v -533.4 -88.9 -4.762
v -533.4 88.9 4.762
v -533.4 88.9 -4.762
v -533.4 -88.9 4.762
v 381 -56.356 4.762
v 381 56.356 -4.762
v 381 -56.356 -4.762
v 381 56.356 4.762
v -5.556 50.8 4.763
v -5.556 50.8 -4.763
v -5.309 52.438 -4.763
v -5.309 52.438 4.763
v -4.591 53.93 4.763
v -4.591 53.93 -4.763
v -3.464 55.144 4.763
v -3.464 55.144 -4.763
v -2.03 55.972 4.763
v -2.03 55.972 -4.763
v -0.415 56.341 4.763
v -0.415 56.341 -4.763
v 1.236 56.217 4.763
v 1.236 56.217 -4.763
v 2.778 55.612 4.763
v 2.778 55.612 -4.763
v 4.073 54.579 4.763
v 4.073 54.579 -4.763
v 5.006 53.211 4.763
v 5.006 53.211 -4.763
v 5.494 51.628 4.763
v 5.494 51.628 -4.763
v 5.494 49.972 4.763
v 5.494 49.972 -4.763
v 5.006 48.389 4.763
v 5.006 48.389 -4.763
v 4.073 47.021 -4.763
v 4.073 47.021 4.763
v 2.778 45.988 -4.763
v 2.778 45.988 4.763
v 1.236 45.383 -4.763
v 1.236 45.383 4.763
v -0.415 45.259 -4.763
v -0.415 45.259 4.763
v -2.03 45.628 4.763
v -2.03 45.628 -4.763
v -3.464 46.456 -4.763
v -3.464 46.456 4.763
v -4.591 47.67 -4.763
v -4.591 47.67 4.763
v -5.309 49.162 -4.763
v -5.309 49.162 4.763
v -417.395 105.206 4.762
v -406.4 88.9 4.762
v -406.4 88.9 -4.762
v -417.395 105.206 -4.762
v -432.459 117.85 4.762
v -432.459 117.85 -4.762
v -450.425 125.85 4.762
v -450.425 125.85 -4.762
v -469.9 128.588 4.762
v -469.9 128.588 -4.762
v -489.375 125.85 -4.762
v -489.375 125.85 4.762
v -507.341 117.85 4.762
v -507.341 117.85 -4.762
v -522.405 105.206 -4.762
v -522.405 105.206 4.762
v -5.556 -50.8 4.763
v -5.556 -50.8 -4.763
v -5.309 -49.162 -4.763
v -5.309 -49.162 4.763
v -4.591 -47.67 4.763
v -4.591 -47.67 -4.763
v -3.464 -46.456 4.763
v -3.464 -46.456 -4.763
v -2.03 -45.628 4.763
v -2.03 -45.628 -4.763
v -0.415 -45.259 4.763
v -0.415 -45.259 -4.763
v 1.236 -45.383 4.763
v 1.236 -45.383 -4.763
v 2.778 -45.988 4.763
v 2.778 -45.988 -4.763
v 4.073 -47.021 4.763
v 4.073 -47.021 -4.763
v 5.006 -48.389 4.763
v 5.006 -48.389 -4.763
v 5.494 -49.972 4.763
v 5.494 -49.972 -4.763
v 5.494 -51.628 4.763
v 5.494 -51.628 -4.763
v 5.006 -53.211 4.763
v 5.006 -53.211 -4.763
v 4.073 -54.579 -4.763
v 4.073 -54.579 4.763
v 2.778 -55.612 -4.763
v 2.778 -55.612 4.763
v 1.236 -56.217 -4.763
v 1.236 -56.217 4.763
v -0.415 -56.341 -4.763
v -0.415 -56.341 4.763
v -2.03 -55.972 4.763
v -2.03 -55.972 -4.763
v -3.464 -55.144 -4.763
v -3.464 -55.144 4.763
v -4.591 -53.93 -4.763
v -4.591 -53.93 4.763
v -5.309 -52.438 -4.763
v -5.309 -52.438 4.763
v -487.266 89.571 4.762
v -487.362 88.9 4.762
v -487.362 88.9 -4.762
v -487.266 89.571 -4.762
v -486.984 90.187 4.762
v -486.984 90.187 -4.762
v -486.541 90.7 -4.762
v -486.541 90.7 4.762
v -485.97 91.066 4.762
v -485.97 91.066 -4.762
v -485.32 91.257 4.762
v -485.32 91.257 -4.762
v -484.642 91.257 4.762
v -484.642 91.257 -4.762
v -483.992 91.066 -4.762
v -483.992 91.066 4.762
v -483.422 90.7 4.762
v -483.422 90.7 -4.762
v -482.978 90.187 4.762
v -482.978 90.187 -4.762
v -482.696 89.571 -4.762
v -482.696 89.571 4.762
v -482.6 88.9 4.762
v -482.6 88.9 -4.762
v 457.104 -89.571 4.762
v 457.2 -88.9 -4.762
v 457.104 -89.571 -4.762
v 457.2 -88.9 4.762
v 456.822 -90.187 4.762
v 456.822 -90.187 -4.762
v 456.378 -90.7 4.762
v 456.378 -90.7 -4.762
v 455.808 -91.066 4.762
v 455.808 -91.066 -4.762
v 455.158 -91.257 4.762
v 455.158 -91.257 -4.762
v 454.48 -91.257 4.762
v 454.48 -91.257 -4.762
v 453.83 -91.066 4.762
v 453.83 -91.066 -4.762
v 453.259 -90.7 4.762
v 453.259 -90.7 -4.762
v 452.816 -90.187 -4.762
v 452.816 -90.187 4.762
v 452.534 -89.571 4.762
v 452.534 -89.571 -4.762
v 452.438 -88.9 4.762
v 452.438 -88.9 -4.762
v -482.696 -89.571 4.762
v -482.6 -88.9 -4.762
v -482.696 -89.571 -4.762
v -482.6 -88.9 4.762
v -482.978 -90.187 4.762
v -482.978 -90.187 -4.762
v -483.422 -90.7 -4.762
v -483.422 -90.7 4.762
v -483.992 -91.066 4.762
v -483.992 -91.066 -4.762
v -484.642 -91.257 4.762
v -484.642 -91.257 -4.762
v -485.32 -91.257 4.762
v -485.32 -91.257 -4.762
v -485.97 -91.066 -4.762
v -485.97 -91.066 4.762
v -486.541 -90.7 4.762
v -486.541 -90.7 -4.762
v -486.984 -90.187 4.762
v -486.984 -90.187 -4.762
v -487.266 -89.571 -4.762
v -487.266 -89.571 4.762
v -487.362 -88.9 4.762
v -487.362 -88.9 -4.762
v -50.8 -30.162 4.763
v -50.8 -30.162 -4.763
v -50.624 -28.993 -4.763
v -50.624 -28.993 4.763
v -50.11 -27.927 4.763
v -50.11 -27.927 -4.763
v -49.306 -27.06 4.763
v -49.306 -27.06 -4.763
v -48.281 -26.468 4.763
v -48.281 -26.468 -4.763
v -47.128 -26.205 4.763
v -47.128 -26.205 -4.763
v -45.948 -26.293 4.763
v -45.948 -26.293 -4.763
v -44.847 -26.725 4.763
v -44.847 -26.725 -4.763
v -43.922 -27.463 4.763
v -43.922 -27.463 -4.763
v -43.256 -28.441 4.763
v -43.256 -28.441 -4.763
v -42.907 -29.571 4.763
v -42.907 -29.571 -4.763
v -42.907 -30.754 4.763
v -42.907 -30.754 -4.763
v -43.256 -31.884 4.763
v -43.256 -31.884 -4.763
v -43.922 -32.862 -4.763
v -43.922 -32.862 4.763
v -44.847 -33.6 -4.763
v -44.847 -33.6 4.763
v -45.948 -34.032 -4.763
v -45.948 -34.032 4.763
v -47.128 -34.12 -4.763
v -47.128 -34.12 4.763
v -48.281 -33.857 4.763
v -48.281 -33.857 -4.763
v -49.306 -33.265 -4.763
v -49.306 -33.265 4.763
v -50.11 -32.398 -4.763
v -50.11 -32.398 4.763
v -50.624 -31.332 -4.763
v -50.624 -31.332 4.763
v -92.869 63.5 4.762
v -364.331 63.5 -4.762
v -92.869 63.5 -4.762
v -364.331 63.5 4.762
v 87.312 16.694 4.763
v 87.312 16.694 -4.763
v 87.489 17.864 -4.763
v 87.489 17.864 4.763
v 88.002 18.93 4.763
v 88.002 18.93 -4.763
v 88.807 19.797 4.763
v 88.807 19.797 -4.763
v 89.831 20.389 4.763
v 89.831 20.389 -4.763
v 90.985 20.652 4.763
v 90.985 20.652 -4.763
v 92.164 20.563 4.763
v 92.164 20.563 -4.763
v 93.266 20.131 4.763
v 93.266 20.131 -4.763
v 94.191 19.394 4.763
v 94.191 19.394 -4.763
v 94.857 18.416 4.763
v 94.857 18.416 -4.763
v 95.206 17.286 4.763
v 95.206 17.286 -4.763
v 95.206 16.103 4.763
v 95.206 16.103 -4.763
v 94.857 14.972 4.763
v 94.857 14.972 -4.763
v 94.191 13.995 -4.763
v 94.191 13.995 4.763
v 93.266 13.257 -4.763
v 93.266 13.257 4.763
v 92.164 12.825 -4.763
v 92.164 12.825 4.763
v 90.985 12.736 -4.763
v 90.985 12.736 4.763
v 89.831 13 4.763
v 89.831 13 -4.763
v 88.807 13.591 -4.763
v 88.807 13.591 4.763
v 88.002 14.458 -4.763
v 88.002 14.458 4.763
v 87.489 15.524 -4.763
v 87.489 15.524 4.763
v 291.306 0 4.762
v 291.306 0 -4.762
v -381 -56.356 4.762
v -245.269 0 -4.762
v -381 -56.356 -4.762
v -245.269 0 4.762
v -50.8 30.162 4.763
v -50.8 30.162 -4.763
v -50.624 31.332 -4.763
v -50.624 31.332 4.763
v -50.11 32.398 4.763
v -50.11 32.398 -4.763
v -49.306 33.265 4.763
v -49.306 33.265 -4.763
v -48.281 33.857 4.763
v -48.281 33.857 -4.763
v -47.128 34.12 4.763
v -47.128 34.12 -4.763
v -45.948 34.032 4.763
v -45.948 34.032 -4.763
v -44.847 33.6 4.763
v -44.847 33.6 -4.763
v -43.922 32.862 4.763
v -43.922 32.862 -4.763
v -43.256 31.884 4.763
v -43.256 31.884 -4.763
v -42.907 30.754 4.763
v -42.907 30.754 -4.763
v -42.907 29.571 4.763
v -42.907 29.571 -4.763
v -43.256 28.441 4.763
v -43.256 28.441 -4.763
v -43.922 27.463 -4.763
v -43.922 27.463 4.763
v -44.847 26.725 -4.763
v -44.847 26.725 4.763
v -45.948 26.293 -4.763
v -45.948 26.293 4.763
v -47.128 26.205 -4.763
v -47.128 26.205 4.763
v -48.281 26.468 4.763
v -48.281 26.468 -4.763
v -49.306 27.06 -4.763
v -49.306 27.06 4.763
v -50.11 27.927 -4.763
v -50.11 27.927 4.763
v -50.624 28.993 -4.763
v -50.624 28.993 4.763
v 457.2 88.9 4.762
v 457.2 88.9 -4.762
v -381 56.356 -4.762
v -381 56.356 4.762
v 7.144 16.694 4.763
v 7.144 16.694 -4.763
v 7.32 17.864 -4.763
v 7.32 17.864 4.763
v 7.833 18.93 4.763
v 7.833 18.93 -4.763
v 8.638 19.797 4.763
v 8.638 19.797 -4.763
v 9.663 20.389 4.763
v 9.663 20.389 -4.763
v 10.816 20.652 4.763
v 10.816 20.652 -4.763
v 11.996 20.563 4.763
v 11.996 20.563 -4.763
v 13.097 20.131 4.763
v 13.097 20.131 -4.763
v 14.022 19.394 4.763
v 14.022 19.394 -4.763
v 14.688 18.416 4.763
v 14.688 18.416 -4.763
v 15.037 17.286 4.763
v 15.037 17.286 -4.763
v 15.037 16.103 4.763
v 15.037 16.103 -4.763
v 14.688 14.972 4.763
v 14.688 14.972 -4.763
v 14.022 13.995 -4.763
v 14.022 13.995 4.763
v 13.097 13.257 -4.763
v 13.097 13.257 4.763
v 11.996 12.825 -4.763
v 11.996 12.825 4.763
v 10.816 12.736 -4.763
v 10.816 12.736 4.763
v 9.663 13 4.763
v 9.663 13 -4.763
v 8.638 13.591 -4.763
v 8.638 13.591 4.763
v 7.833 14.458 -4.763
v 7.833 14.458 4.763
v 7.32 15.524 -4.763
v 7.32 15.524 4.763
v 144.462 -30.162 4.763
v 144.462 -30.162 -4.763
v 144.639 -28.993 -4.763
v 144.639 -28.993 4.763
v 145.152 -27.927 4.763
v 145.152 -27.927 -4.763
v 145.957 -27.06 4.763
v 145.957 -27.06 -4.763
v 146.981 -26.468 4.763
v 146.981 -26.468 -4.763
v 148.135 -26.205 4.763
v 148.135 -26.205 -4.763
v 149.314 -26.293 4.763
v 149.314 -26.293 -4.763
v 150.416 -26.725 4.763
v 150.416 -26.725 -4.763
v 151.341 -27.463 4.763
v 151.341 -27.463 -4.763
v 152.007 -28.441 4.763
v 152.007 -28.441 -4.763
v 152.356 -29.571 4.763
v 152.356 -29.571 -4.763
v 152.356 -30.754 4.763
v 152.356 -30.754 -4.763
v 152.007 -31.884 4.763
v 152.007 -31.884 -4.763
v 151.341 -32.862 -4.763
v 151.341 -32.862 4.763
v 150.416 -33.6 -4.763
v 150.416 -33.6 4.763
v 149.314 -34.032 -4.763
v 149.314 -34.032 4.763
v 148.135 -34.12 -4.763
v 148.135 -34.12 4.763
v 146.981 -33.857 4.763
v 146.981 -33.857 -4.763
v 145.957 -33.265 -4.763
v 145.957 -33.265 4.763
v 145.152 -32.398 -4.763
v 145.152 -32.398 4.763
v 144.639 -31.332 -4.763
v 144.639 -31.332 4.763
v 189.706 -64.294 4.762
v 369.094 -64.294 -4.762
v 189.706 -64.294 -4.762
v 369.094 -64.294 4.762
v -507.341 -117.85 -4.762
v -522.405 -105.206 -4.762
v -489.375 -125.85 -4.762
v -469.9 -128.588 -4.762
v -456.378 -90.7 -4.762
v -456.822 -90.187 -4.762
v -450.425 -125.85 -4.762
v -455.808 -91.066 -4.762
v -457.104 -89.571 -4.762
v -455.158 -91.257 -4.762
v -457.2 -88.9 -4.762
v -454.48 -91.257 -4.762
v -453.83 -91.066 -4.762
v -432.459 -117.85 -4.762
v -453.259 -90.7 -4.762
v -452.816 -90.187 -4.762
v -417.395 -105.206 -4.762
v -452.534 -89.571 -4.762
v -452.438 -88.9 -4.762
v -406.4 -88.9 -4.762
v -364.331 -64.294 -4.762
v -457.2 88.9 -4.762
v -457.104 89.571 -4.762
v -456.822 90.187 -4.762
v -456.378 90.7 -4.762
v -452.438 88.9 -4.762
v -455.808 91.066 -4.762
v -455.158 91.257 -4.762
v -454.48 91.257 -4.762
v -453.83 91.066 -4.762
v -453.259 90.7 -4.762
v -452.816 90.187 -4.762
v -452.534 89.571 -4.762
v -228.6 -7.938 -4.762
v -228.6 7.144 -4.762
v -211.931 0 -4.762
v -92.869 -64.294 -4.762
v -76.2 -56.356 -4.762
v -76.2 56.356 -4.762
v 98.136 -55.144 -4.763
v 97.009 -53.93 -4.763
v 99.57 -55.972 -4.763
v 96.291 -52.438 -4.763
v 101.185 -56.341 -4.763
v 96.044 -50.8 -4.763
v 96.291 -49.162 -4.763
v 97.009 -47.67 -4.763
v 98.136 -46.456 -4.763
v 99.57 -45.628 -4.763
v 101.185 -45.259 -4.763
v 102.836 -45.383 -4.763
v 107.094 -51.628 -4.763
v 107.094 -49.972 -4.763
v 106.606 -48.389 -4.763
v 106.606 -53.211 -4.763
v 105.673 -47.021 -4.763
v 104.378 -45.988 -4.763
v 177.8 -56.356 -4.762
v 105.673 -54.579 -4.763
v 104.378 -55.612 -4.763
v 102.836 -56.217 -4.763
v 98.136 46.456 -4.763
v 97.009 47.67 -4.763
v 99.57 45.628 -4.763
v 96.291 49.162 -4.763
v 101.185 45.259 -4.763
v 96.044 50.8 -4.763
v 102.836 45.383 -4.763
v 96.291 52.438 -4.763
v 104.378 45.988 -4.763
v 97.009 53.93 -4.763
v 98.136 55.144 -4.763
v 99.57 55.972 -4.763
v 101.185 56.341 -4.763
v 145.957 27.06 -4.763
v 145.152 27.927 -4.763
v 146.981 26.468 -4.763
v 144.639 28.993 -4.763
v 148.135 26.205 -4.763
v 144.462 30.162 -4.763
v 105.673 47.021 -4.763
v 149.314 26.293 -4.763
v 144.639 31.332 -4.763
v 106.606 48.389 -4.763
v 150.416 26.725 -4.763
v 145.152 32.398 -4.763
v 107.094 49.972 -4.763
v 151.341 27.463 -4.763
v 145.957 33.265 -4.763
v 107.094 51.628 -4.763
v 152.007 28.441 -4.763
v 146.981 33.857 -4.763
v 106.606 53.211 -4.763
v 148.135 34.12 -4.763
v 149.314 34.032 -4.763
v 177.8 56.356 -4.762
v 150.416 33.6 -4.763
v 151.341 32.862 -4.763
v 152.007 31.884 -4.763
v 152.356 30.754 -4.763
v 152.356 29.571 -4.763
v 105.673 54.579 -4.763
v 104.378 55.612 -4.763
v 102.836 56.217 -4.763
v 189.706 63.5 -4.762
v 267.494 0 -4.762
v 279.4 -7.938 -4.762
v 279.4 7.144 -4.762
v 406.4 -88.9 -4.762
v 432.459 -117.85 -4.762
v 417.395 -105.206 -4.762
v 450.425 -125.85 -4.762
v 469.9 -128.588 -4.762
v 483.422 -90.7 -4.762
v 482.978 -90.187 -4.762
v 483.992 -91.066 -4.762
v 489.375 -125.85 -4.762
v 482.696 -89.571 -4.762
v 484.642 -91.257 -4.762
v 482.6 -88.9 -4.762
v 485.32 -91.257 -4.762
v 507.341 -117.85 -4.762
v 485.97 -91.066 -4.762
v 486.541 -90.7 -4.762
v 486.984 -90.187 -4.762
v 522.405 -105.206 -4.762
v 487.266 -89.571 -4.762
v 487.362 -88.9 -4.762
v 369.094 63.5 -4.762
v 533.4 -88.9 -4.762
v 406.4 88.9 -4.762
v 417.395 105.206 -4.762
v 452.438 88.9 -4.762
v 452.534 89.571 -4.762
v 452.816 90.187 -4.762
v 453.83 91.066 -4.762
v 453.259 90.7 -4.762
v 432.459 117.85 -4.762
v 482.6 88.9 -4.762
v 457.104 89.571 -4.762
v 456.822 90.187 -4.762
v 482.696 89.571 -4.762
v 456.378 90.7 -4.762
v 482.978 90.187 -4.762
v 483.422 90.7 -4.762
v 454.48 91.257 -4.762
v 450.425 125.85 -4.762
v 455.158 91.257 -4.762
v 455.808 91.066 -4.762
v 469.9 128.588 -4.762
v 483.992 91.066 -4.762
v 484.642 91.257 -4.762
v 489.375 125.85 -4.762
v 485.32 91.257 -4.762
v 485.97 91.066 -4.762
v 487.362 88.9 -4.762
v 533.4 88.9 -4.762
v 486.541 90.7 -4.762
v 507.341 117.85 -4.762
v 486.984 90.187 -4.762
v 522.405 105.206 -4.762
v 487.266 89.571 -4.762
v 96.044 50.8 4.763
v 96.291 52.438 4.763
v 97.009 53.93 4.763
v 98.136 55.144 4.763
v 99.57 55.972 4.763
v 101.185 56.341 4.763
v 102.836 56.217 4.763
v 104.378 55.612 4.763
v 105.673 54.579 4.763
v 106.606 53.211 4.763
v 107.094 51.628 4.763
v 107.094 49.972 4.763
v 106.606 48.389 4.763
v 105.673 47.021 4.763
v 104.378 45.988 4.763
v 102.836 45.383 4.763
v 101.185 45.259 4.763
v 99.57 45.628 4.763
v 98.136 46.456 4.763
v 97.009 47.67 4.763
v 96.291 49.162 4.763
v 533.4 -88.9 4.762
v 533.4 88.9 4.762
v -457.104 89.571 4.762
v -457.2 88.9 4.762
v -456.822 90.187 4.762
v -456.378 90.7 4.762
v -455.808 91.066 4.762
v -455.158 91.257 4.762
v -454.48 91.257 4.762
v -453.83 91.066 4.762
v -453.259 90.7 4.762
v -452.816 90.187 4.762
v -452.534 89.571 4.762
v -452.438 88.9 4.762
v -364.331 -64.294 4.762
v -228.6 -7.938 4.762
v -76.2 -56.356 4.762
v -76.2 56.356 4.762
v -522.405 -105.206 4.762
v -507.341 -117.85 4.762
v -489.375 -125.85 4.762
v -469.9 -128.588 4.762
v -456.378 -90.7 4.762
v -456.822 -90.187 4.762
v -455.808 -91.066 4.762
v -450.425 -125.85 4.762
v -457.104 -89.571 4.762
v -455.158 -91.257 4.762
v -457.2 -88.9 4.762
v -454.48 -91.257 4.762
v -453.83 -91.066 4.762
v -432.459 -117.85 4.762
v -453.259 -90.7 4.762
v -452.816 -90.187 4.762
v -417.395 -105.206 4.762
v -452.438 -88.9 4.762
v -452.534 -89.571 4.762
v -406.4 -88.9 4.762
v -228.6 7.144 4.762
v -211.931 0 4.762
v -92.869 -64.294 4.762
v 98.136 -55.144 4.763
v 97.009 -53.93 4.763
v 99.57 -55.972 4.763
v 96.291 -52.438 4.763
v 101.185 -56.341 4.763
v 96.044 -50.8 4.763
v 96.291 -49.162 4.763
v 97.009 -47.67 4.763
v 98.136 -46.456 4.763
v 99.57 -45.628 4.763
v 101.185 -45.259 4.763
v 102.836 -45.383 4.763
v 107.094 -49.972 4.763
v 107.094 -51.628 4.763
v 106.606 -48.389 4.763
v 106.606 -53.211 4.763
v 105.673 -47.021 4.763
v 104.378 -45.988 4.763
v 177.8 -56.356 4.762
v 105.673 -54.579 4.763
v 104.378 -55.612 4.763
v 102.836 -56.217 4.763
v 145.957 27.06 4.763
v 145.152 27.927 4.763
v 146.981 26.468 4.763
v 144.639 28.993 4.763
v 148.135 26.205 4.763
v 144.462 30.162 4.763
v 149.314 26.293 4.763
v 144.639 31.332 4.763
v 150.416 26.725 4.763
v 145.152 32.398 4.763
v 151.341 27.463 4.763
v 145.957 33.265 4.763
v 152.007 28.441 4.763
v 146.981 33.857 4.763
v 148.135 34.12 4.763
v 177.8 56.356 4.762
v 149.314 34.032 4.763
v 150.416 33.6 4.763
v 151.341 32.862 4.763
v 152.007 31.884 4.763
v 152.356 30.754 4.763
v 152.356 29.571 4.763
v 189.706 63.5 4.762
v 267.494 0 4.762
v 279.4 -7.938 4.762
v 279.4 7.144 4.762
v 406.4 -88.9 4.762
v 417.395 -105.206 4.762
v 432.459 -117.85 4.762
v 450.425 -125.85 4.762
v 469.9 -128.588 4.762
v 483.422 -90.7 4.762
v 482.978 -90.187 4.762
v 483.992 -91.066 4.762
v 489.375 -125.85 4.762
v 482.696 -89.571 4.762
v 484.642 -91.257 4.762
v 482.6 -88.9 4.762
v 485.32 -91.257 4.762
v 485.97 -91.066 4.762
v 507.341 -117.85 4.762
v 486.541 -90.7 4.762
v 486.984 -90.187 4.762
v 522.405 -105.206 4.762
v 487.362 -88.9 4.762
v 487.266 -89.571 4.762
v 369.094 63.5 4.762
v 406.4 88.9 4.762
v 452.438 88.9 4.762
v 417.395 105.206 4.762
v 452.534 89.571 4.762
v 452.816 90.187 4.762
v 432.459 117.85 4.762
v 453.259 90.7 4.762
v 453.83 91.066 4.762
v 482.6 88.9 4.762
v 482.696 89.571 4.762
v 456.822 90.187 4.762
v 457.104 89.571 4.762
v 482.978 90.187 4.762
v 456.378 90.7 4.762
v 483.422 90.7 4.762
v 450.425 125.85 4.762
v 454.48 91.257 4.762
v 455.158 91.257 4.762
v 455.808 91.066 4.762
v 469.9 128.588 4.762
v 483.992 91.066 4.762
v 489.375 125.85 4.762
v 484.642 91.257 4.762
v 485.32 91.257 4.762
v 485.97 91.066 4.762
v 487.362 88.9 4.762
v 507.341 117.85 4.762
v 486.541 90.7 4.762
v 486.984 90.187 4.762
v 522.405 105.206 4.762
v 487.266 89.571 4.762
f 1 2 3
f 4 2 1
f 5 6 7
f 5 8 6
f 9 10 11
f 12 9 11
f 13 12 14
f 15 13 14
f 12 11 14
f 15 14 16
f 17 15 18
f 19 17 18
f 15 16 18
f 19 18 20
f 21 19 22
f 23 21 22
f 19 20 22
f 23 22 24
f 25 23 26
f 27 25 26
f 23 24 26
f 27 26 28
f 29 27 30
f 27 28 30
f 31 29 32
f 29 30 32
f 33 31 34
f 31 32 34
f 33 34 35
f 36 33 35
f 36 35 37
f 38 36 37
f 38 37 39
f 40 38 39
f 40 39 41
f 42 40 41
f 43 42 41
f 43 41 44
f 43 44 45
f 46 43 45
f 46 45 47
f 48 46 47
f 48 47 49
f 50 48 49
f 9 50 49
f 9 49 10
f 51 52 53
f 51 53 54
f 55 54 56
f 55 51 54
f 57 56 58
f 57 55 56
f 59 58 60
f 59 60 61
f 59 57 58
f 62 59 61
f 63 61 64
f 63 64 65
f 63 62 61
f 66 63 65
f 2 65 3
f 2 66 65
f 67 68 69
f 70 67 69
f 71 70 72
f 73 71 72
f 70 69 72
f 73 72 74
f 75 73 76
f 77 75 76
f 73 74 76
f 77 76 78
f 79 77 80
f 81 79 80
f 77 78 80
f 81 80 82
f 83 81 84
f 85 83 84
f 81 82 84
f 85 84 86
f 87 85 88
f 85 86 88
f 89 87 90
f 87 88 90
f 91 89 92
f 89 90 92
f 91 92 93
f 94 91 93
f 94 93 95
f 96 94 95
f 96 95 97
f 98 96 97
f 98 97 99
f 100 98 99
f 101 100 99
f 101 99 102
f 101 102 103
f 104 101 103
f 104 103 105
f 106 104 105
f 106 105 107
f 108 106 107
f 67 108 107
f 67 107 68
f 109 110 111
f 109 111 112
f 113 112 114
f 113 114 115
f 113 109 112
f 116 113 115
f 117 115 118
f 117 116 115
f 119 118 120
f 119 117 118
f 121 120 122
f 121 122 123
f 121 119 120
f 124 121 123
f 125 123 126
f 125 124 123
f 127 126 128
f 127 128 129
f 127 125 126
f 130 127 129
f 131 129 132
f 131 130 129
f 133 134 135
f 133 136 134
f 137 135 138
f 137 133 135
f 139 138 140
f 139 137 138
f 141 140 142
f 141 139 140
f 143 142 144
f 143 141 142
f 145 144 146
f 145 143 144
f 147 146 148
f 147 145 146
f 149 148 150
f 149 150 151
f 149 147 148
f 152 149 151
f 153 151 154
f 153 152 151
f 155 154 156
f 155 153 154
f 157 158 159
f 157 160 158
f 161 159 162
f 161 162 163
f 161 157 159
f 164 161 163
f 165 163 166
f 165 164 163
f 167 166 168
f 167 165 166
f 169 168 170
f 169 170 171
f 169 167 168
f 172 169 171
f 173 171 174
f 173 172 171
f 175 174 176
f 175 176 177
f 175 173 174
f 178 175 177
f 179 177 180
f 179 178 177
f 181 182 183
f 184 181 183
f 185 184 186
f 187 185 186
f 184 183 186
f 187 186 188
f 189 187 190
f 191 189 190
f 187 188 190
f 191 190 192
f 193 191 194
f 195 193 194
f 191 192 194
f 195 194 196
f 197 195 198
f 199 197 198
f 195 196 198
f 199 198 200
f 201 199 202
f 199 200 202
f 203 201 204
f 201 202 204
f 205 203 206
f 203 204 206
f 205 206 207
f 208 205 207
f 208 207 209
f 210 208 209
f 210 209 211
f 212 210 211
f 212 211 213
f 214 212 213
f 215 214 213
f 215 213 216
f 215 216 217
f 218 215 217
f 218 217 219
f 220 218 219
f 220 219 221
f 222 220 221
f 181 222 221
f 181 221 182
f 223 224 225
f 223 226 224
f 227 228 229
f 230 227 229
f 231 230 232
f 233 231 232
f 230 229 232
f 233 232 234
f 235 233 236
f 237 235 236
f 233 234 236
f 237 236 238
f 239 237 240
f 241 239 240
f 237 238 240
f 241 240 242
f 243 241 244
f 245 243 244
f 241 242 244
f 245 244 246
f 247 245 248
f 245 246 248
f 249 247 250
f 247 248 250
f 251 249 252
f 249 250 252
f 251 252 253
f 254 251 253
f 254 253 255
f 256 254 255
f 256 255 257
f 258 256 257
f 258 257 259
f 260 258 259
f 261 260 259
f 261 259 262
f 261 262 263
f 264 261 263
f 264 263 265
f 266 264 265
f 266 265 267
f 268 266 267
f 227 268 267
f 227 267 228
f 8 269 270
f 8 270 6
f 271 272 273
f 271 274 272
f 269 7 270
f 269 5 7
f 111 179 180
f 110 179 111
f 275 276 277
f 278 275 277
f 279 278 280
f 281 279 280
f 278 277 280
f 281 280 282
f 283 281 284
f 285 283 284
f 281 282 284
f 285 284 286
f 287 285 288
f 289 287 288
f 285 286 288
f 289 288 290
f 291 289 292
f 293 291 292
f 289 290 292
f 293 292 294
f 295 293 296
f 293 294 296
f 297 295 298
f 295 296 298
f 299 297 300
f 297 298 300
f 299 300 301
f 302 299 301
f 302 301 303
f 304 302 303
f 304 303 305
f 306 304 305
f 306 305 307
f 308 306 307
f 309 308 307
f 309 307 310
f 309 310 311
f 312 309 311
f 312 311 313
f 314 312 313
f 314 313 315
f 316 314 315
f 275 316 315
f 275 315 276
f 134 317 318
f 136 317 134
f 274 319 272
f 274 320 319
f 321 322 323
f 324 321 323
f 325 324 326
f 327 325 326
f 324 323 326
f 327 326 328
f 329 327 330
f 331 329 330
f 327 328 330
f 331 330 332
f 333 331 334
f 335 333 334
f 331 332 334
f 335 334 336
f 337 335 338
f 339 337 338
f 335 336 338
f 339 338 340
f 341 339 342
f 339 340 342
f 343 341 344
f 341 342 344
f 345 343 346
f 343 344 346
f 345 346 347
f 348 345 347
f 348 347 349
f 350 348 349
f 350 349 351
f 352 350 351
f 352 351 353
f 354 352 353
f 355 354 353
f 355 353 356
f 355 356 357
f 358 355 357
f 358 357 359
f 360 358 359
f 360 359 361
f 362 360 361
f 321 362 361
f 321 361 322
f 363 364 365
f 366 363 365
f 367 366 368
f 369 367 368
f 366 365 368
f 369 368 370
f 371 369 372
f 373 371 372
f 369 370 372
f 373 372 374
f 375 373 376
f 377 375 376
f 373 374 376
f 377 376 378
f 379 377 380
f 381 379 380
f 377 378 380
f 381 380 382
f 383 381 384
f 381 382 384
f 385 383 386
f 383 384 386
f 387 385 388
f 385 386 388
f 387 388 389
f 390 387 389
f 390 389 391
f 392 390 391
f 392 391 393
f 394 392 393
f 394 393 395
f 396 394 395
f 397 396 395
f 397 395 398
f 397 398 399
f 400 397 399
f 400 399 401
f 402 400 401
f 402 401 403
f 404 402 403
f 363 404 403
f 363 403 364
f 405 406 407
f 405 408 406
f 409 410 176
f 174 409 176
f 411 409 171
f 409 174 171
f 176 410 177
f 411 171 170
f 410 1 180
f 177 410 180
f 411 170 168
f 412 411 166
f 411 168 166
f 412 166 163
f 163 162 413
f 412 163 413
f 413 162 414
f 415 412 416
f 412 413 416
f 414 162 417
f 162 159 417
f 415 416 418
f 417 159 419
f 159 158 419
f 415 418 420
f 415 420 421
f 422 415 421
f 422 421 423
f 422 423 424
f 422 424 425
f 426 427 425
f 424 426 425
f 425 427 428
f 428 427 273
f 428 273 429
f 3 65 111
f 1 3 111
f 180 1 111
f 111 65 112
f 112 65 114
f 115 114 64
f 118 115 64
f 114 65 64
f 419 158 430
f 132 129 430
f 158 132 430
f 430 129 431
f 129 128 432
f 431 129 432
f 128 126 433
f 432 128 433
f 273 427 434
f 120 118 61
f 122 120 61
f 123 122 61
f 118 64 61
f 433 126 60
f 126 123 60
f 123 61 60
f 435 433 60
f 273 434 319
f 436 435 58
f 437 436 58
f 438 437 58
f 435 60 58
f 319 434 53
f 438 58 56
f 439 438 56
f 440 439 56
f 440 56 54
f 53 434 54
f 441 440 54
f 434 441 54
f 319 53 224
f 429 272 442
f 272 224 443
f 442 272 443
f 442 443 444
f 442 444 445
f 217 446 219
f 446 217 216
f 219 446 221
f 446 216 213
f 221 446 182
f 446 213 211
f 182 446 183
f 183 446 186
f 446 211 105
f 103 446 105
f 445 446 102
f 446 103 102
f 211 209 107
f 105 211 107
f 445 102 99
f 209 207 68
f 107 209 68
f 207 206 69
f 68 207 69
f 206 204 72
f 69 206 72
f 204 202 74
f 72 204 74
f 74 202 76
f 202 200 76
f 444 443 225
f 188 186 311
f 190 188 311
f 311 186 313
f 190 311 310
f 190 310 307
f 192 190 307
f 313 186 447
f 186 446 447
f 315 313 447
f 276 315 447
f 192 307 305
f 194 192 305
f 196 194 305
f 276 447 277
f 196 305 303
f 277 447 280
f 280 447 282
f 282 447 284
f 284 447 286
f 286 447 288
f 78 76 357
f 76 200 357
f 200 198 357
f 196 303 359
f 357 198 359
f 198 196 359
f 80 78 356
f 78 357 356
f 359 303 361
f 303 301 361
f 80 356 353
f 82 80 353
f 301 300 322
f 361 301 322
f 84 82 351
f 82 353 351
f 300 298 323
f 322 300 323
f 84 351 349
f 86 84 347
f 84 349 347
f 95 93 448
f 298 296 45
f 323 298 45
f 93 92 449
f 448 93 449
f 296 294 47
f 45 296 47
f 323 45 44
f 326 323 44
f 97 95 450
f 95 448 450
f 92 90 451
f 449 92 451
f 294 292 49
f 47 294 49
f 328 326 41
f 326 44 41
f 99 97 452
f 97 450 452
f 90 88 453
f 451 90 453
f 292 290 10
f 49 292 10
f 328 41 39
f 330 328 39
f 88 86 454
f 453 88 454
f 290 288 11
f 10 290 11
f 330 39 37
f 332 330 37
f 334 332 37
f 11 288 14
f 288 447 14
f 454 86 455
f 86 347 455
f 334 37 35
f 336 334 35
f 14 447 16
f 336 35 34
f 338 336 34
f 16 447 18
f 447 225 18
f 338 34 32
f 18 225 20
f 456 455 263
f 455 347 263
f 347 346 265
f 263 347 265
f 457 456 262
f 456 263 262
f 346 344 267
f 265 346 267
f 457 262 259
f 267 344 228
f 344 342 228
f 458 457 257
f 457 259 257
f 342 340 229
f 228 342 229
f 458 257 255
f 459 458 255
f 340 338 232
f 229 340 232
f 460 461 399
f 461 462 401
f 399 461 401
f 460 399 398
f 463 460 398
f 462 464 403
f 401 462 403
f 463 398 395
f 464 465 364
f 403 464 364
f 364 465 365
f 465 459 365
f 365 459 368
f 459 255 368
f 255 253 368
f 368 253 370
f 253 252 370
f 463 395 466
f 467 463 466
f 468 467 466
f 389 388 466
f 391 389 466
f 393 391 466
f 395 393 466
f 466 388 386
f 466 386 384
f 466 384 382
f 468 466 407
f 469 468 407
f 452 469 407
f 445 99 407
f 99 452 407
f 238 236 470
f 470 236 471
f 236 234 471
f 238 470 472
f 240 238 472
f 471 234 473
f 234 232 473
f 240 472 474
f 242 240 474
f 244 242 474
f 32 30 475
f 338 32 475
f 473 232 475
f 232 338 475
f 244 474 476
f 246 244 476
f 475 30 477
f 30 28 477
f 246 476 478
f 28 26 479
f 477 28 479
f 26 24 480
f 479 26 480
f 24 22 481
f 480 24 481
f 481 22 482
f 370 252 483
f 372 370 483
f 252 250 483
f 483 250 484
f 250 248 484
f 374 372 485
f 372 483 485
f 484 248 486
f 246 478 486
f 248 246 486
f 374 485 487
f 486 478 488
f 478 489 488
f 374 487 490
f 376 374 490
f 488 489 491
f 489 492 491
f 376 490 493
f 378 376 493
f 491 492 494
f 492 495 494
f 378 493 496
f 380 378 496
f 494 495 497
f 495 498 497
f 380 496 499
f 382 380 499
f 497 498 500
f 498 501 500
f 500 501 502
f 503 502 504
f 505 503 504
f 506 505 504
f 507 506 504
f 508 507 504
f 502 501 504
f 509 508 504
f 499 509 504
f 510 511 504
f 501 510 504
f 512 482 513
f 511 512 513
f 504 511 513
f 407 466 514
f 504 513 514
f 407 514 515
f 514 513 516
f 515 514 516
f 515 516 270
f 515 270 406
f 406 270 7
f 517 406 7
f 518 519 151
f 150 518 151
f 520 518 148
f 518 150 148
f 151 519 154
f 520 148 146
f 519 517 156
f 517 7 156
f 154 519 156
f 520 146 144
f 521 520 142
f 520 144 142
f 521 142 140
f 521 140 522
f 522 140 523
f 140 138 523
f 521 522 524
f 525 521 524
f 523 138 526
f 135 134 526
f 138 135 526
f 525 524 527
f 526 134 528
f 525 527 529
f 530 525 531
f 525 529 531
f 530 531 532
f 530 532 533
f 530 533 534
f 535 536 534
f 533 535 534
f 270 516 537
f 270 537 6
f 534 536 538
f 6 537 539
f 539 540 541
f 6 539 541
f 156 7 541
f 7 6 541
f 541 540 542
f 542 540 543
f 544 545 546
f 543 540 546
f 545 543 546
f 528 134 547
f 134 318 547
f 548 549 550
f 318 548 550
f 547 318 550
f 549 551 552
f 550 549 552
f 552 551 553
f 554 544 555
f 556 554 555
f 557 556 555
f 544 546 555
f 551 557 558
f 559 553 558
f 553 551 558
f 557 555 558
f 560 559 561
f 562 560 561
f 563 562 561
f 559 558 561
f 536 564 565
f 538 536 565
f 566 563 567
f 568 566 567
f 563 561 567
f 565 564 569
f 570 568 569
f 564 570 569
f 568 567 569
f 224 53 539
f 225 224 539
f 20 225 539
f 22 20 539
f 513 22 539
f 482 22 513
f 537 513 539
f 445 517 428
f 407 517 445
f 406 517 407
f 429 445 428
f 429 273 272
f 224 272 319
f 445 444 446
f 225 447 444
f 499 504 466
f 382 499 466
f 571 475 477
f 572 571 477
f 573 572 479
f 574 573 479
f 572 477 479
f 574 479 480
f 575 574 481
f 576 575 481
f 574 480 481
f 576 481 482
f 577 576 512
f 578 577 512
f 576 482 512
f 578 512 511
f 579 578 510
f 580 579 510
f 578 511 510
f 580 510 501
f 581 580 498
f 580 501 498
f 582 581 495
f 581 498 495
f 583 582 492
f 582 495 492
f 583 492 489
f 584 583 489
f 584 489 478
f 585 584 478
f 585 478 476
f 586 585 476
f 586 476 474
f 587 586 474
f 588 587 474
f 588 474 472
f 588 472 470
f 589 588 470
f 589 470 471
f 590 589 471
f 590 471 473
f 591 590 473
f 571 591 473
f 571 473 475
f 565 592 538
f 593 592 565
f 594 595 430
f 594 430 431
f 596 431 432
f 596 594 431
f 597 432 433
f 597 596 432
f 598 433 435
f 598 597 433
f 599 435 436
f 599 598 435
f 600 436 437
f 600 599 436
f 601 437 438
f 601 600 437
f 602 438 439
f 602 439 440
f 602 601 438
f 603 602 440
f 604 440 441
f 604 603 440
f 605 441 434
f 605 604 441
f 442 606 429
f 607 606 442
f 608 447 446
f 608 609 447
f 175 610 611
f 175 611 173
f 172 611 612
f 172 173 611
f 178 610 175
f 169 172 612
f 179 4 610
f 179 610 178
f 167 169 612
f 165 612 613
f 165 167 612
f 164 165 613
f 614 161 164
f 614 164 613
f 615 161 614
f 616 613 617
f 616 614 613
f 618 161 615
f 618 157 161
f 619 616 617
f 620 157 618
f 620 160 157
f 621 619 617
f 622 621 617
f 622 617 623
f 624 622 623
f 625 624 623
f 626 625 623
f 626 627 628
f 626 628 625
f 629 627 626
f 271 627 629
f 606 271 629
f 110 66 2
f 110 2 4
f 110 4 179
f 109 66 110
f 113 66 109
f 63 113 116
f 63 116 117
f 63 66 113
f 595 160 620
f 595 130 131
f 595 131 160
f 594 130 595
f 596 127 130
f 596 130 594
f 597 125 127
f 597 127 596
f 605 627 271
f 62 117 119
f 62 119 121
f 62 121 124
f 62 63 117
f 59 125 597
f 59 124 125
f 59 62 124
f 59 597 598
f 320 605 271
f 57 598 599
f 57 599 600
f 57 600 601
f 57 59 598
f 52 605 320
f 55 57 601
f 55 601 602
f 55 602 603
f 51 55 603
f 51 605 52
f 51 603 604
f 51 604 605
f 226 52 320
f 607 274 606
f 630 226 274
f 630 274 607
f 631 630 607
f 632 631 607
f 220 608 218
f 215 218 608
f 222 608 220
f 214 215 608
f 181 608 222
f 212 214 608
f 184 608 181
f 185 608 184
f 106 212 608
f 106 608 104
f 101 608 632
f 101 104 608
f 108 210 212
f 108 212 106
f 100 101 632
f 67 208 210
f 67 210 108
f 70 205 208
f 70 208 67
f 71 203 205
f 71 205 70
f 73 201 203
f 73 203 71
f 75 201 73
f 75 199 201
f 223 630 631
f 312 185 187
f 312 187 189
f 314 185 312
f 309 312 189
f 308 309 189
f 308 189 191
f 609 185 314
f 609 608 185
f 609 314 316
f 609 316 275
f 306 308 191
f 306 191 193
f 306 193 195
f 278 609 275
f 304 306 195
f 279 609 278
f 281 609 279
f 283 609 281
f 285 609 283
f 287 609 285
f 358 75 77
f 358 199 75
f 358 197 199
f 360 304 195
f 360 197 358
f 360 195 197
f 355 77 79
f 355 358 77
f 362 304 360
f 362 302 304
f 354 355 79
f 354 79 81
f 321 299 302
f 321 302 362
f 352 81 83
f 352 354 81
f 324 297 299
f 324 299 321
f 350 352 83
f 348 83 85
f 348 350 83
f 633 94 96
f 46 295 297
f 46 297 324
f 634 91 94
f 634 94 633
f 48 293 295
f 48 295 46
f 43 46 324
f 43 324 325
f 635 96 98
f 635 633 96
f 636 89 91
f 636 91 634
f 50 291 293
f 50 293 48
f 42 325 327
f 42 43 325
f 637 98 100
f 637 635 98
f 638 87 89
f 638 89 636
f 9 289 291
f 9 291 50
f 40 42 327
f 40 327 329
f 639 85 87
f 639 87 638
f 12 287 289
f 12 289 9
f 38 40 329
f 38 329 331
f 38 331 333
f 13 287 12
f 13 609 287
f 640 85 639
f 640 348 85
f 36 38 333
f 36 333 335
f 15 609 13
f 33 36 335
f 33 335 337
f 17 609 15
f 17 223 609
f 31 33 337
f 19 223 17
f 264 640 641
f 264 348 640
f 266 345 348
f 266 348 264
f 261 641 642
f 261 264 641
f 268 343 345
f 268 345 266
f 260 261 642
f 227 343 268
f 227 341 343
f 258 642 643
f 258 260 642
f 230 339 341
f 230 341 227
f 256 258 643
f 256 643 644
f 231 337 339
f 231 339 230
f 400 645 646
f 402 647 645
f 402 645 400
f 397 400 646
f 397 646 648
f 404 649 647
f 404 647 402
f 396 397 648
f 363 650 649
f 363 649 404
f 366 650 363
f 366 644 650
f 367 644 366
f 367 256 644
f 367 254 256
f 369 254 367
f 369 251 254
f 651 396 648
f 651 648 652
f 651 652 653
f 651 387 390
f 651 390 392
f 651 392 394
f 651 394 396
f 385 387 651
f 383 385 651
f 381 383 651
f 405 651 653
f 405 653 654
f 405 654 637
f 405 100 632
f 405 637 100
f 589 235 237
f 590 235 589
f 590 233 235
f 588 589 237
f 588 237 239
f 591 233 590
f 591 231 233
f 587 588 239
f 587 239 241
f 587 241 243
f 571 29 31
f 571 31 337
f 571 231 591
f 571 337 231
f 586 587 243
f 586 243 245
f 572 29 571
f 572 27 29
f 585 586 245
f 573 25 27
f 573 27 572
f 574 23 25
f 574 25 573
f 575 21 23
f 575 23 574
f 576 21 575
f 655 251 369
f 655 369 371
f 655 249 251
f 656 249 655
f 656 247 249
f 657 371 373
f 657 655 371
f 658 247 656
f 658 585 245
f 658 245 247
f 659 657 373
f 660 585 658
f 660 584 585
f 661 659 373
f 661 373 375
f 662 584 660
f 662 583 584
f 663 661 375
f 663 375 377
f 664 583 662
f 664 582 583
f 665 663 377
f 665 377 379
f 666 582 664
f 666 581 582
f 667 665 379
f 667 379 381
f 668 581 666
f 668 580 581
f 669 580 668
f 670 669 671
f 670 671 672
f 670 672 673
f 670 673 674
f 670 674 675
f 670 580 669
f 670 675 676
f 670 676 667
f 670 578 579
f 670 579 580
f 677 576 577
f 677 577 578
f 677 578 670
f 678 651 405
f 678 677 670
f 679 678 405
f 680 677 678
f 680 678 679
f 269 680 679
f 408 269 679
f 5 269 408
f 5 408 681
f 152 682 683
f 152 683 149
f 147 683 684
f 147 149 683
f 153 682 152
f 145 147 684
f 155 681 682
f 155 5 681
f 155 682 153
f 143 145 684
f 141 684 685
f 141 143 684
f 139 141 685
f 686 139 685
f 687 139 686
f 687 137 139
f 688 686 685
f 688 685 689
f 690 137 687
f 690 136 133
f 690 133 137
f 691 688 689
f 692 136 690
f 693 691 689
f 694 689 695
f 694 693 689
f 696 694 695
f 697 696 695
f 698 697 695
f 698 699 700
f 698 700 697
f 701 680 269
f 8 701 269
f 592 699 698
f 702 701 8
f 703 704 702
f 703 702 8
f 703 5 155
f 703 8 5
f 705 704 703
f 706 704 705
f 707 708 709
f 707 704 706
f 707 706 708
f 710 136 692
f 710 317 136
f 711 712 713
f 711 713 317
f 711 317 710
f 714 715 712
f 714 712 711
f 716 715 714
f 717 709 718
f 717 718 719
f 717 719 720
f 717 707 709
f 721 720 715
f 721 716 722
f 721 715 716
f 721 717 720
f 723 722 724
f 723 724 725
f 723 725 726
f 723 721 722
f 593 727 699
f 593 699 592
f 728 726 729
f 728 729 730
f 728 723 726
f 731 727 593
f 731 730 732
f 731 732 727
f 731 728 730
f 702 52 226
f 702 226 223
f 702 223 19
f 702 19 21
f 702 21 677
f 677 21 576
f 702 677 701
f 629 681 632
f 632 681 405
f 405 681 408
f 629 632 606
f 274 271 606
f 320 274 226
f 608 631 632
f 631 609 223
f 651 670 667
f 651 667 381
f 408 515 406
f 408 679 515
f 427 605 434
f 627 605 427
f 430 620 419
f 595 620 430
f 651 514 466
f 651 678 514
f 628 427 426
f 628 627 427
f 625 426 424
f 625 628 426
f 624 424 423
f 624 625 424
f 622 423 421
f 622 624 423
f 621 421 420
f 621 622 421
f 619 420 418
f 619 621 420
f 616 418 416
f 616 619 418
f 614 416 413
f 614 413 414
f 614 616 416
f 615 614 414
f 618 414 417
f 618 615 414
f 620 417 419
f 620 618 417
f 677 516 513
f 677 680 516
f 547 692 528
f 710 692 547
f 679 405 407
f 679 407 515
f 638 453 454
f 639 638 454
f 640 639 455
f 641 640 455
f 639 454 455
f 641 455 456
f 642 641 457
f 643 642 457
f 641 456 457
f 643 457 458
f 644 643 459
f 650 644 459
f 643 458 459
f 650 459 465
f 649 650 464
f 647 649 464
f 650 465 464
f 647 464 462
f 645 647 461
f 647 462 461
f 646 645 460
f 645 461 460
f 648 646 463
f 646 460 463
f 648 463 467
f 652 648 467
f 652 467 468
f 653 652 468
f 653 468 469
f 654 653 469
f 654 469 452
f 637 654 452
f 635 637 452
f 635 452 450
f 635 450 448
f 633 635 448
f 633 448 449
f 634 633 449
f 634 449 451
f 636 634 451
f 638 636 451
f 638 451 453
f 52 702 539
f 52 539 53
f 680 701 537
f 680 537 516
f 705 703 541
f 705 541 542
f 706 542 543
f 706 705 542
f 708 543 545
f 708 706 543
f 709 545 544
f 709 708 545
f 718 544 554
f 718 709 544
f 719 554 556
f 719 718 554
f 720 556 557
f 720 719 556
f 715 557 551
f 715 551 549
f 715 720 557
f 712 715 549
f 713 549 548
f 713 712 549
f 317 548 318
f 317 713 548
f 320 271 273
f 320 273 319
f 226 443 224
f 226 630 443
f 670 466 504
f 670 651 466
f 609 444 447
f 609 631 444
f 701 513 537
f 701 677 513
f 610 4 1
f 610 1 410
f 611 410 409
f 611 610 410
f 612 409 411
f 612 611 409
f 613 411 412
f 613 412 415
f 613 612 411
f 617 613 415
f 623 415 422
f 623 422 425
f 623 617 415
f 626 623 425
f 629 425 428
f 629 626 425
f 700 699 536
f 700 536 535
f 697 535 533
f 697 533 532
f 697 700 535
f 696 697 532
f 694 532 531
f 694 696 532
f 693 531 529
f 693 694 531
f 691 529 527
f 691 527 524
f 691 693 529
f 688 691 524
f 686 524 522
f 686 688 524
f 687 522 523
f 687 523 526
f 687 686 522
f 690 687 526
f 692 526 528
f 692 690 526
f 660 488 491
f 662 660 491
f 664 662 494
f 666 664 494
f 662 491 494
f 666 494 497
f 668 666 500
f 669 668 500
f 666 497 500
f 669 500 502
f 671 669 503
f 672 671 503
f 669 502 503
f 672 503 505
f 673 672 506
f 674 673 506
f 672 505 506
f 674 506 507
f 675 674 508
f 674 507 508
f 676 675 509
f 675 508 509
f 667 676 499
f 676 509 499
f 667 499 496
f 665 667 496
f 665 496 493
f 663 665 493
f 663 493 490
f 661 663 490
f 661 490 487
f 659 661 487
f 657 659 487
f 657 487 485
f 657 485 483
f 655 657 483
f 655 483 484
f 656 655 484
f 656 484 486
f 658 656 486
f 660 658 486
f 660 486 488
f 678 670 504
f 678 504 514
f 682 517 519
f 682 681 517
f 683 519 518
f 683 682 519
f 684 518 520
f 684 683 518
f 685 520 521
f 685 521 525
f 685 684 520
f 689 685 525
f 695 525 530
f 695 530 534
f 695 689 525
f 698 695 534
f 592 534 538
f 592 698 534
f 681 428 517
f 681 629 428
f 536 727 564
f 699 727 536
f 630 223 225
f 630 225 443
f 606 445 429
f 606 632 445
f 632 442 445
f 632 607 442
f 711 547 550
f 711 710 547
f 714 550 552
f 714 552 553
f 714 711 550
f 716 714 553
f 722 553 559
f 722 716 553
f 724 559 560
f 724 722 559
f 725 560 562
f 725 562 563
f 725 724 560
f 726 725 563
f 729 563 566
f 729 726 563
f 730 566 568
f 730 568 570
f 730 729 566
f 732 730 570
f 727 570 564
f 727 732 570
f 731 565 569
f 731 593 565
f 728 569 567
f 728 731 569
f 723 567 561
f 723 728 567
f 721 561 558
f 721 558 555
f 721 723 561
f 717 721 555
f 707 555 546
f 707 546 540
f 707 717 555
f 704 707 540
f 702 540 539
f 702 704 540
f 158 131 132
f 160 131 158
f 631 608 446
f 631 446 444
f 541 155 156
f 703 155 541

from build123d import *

# Parameters (mm, degrees)
F1_DEPTH = 4.7625
F3_D     = 11.1125
F4_D     = 7.9375


# Not quite as in the source:
# - a length typed as a fraction of an inch, garbled in the dataset ("3 / 203.2 mm" for 3/8 in), is restored


with BuildPart() as f1:
    # F0 (on Top) → F1 (new body, symmetric)
    with BuildSketch(Plane.XY):
        with BuildLine():
            ThreePointArc((533.4, 88.9), (469.9, 128.5875), (406.4, 88.9))
            Line((406.4, 88.9), (-406.4, 88.9))
            ThreePointArc((-406.4, 88.9), (-469.9, 128.5875), (-533.4, 88.9))
            Line((-533.4, 88.9), (-533.4, -88.9))
            ThreePointArc((-533.4, -88.9), (-469.9, -128.5875), (-406.4, -88.9))
            Line((-406.4, -88.9), (406.4, -88.9))
            ThreePointArc((406.4, -88.9), (469.9, -128.5875), (533.4, -88.9))
            Line((533.4, -88.9), (533.4, 88.9))
        make_face()
        Polygon((-364.33125, -64.29375), (-228.6, -7.9375), (-92.86875, -64.29375), align=None, mode=Mode.SUBTRACT)
        Polygon((189.70625, -64.29375), (279.4, -7.9375), (369.09375, -64.29375), align=None, mode=Mode.SUBTRACT)
        with BuildLine():
            ThreePointArc((-487.3625, 88.9), (-484.98125, 91.28125), (-482.6, 88.9))
            Line((-482.6, 88.9), (-482.6, -88.9))
            ThreePointArc((-482.6, -88.9), (-484.98125, -91.28125), (-487.3625, -88.9))
            Line((-487.3625, -88.9), (-487.3625, 88.9))
        make_face(mode=Mode.SUBTRACT)
        with BuildLine():
            ThreePointArc((-457.2, 88.9), (-454.81875, 91.28125), (-452.4375, 88.9))
            Line((-452.4375, 88.9), (-452.4375, -88.9))
            ThreePointArc((-452.4375, -88.9), (-454.81875, -91.28125), (-457.2, -88.9))
            Line((-457.2, -88.9), (-457.2, 88.9))
        make_face(mode=Mode.SUBTRACT)
        Polygon((-381, -56.35625), (-381, 56.35625), (-245.26875, 0), align=None, mode=Mode.SUBTRACT)
        Polygon((-76.2, -56.35625), (-211.93125, 0), (-76.2, 56.35625), align=None, mode=Mode.SUBTRACT)
        Polygon((-92.86875, 63.5), (-228.6, 7.14375), (-364.33125, 63.5), align=None, mode=Mode.SUBTRACT)
        Polygon((177.8, 56.35625), (267.49375, 0), (177.8, -56.35625), align=None, mode=Mode.SUBTRACT)
        Polygon((291.30625, 0), (381, 56.35625), (381, -56.35625), align=None, mode=Mode.SUBTRACT)
        with BuildLine():
            Line((452.4375, -88.9), (452.4375, 88.9))
            ThreePointArc((452.4375, 88.9), (454.81875, 91.28125), (457.2, 88.9))
            Line((457.2, 88.9), (457.2, -88.9))
            ThreePointArc((457.2, -88.9), (454.81875, -91.28125), (452.4375, -88.9))
        make_face(mode=Mode.SUBTRACT)
        with BuildLine():
            ThreePointArc((487.3625, -88.9), (484.98125, -91.28125), (482.6, -88.9))
            Line((482.6, -88.9), (482.6, 88.9))
            ThreePointArc((482.6, 88.9), (484.98125, 91.28125), (487.3625, 88.9))
            Line((487.3625, 88.9), (487.3625, -88.9))
        make_face(mode=Mode.SUBTRACT)
        Polygon((369.09375, 63.5), (279.4, 7.14375), (189.70625, 63.5), align=None, mode=Mode.SUBTRACT)
    extrude(amount=F1_DEPTH, both=True)

    # F3 (through all)
    with Locations(Plane.XY.offset(4.7625)):
        with Locations((0, 50.8), (101.6, 50.8), (101.6, -50.8), (0, -50.8)):
            Hole(F3_D / 2)

    # F4 (through all)
    with Locations(Plane.XY.offset(4.7625)):
        with Locations((-46.83125, 30.1625), (-46.83125, -30.1625), (11.1125, 16.69415), (91.28125, 16.69415), (148.43125, 30.1625), (148.43125, -30.1625)):
            Hole(F4_D / 2)


solid = f1.part
